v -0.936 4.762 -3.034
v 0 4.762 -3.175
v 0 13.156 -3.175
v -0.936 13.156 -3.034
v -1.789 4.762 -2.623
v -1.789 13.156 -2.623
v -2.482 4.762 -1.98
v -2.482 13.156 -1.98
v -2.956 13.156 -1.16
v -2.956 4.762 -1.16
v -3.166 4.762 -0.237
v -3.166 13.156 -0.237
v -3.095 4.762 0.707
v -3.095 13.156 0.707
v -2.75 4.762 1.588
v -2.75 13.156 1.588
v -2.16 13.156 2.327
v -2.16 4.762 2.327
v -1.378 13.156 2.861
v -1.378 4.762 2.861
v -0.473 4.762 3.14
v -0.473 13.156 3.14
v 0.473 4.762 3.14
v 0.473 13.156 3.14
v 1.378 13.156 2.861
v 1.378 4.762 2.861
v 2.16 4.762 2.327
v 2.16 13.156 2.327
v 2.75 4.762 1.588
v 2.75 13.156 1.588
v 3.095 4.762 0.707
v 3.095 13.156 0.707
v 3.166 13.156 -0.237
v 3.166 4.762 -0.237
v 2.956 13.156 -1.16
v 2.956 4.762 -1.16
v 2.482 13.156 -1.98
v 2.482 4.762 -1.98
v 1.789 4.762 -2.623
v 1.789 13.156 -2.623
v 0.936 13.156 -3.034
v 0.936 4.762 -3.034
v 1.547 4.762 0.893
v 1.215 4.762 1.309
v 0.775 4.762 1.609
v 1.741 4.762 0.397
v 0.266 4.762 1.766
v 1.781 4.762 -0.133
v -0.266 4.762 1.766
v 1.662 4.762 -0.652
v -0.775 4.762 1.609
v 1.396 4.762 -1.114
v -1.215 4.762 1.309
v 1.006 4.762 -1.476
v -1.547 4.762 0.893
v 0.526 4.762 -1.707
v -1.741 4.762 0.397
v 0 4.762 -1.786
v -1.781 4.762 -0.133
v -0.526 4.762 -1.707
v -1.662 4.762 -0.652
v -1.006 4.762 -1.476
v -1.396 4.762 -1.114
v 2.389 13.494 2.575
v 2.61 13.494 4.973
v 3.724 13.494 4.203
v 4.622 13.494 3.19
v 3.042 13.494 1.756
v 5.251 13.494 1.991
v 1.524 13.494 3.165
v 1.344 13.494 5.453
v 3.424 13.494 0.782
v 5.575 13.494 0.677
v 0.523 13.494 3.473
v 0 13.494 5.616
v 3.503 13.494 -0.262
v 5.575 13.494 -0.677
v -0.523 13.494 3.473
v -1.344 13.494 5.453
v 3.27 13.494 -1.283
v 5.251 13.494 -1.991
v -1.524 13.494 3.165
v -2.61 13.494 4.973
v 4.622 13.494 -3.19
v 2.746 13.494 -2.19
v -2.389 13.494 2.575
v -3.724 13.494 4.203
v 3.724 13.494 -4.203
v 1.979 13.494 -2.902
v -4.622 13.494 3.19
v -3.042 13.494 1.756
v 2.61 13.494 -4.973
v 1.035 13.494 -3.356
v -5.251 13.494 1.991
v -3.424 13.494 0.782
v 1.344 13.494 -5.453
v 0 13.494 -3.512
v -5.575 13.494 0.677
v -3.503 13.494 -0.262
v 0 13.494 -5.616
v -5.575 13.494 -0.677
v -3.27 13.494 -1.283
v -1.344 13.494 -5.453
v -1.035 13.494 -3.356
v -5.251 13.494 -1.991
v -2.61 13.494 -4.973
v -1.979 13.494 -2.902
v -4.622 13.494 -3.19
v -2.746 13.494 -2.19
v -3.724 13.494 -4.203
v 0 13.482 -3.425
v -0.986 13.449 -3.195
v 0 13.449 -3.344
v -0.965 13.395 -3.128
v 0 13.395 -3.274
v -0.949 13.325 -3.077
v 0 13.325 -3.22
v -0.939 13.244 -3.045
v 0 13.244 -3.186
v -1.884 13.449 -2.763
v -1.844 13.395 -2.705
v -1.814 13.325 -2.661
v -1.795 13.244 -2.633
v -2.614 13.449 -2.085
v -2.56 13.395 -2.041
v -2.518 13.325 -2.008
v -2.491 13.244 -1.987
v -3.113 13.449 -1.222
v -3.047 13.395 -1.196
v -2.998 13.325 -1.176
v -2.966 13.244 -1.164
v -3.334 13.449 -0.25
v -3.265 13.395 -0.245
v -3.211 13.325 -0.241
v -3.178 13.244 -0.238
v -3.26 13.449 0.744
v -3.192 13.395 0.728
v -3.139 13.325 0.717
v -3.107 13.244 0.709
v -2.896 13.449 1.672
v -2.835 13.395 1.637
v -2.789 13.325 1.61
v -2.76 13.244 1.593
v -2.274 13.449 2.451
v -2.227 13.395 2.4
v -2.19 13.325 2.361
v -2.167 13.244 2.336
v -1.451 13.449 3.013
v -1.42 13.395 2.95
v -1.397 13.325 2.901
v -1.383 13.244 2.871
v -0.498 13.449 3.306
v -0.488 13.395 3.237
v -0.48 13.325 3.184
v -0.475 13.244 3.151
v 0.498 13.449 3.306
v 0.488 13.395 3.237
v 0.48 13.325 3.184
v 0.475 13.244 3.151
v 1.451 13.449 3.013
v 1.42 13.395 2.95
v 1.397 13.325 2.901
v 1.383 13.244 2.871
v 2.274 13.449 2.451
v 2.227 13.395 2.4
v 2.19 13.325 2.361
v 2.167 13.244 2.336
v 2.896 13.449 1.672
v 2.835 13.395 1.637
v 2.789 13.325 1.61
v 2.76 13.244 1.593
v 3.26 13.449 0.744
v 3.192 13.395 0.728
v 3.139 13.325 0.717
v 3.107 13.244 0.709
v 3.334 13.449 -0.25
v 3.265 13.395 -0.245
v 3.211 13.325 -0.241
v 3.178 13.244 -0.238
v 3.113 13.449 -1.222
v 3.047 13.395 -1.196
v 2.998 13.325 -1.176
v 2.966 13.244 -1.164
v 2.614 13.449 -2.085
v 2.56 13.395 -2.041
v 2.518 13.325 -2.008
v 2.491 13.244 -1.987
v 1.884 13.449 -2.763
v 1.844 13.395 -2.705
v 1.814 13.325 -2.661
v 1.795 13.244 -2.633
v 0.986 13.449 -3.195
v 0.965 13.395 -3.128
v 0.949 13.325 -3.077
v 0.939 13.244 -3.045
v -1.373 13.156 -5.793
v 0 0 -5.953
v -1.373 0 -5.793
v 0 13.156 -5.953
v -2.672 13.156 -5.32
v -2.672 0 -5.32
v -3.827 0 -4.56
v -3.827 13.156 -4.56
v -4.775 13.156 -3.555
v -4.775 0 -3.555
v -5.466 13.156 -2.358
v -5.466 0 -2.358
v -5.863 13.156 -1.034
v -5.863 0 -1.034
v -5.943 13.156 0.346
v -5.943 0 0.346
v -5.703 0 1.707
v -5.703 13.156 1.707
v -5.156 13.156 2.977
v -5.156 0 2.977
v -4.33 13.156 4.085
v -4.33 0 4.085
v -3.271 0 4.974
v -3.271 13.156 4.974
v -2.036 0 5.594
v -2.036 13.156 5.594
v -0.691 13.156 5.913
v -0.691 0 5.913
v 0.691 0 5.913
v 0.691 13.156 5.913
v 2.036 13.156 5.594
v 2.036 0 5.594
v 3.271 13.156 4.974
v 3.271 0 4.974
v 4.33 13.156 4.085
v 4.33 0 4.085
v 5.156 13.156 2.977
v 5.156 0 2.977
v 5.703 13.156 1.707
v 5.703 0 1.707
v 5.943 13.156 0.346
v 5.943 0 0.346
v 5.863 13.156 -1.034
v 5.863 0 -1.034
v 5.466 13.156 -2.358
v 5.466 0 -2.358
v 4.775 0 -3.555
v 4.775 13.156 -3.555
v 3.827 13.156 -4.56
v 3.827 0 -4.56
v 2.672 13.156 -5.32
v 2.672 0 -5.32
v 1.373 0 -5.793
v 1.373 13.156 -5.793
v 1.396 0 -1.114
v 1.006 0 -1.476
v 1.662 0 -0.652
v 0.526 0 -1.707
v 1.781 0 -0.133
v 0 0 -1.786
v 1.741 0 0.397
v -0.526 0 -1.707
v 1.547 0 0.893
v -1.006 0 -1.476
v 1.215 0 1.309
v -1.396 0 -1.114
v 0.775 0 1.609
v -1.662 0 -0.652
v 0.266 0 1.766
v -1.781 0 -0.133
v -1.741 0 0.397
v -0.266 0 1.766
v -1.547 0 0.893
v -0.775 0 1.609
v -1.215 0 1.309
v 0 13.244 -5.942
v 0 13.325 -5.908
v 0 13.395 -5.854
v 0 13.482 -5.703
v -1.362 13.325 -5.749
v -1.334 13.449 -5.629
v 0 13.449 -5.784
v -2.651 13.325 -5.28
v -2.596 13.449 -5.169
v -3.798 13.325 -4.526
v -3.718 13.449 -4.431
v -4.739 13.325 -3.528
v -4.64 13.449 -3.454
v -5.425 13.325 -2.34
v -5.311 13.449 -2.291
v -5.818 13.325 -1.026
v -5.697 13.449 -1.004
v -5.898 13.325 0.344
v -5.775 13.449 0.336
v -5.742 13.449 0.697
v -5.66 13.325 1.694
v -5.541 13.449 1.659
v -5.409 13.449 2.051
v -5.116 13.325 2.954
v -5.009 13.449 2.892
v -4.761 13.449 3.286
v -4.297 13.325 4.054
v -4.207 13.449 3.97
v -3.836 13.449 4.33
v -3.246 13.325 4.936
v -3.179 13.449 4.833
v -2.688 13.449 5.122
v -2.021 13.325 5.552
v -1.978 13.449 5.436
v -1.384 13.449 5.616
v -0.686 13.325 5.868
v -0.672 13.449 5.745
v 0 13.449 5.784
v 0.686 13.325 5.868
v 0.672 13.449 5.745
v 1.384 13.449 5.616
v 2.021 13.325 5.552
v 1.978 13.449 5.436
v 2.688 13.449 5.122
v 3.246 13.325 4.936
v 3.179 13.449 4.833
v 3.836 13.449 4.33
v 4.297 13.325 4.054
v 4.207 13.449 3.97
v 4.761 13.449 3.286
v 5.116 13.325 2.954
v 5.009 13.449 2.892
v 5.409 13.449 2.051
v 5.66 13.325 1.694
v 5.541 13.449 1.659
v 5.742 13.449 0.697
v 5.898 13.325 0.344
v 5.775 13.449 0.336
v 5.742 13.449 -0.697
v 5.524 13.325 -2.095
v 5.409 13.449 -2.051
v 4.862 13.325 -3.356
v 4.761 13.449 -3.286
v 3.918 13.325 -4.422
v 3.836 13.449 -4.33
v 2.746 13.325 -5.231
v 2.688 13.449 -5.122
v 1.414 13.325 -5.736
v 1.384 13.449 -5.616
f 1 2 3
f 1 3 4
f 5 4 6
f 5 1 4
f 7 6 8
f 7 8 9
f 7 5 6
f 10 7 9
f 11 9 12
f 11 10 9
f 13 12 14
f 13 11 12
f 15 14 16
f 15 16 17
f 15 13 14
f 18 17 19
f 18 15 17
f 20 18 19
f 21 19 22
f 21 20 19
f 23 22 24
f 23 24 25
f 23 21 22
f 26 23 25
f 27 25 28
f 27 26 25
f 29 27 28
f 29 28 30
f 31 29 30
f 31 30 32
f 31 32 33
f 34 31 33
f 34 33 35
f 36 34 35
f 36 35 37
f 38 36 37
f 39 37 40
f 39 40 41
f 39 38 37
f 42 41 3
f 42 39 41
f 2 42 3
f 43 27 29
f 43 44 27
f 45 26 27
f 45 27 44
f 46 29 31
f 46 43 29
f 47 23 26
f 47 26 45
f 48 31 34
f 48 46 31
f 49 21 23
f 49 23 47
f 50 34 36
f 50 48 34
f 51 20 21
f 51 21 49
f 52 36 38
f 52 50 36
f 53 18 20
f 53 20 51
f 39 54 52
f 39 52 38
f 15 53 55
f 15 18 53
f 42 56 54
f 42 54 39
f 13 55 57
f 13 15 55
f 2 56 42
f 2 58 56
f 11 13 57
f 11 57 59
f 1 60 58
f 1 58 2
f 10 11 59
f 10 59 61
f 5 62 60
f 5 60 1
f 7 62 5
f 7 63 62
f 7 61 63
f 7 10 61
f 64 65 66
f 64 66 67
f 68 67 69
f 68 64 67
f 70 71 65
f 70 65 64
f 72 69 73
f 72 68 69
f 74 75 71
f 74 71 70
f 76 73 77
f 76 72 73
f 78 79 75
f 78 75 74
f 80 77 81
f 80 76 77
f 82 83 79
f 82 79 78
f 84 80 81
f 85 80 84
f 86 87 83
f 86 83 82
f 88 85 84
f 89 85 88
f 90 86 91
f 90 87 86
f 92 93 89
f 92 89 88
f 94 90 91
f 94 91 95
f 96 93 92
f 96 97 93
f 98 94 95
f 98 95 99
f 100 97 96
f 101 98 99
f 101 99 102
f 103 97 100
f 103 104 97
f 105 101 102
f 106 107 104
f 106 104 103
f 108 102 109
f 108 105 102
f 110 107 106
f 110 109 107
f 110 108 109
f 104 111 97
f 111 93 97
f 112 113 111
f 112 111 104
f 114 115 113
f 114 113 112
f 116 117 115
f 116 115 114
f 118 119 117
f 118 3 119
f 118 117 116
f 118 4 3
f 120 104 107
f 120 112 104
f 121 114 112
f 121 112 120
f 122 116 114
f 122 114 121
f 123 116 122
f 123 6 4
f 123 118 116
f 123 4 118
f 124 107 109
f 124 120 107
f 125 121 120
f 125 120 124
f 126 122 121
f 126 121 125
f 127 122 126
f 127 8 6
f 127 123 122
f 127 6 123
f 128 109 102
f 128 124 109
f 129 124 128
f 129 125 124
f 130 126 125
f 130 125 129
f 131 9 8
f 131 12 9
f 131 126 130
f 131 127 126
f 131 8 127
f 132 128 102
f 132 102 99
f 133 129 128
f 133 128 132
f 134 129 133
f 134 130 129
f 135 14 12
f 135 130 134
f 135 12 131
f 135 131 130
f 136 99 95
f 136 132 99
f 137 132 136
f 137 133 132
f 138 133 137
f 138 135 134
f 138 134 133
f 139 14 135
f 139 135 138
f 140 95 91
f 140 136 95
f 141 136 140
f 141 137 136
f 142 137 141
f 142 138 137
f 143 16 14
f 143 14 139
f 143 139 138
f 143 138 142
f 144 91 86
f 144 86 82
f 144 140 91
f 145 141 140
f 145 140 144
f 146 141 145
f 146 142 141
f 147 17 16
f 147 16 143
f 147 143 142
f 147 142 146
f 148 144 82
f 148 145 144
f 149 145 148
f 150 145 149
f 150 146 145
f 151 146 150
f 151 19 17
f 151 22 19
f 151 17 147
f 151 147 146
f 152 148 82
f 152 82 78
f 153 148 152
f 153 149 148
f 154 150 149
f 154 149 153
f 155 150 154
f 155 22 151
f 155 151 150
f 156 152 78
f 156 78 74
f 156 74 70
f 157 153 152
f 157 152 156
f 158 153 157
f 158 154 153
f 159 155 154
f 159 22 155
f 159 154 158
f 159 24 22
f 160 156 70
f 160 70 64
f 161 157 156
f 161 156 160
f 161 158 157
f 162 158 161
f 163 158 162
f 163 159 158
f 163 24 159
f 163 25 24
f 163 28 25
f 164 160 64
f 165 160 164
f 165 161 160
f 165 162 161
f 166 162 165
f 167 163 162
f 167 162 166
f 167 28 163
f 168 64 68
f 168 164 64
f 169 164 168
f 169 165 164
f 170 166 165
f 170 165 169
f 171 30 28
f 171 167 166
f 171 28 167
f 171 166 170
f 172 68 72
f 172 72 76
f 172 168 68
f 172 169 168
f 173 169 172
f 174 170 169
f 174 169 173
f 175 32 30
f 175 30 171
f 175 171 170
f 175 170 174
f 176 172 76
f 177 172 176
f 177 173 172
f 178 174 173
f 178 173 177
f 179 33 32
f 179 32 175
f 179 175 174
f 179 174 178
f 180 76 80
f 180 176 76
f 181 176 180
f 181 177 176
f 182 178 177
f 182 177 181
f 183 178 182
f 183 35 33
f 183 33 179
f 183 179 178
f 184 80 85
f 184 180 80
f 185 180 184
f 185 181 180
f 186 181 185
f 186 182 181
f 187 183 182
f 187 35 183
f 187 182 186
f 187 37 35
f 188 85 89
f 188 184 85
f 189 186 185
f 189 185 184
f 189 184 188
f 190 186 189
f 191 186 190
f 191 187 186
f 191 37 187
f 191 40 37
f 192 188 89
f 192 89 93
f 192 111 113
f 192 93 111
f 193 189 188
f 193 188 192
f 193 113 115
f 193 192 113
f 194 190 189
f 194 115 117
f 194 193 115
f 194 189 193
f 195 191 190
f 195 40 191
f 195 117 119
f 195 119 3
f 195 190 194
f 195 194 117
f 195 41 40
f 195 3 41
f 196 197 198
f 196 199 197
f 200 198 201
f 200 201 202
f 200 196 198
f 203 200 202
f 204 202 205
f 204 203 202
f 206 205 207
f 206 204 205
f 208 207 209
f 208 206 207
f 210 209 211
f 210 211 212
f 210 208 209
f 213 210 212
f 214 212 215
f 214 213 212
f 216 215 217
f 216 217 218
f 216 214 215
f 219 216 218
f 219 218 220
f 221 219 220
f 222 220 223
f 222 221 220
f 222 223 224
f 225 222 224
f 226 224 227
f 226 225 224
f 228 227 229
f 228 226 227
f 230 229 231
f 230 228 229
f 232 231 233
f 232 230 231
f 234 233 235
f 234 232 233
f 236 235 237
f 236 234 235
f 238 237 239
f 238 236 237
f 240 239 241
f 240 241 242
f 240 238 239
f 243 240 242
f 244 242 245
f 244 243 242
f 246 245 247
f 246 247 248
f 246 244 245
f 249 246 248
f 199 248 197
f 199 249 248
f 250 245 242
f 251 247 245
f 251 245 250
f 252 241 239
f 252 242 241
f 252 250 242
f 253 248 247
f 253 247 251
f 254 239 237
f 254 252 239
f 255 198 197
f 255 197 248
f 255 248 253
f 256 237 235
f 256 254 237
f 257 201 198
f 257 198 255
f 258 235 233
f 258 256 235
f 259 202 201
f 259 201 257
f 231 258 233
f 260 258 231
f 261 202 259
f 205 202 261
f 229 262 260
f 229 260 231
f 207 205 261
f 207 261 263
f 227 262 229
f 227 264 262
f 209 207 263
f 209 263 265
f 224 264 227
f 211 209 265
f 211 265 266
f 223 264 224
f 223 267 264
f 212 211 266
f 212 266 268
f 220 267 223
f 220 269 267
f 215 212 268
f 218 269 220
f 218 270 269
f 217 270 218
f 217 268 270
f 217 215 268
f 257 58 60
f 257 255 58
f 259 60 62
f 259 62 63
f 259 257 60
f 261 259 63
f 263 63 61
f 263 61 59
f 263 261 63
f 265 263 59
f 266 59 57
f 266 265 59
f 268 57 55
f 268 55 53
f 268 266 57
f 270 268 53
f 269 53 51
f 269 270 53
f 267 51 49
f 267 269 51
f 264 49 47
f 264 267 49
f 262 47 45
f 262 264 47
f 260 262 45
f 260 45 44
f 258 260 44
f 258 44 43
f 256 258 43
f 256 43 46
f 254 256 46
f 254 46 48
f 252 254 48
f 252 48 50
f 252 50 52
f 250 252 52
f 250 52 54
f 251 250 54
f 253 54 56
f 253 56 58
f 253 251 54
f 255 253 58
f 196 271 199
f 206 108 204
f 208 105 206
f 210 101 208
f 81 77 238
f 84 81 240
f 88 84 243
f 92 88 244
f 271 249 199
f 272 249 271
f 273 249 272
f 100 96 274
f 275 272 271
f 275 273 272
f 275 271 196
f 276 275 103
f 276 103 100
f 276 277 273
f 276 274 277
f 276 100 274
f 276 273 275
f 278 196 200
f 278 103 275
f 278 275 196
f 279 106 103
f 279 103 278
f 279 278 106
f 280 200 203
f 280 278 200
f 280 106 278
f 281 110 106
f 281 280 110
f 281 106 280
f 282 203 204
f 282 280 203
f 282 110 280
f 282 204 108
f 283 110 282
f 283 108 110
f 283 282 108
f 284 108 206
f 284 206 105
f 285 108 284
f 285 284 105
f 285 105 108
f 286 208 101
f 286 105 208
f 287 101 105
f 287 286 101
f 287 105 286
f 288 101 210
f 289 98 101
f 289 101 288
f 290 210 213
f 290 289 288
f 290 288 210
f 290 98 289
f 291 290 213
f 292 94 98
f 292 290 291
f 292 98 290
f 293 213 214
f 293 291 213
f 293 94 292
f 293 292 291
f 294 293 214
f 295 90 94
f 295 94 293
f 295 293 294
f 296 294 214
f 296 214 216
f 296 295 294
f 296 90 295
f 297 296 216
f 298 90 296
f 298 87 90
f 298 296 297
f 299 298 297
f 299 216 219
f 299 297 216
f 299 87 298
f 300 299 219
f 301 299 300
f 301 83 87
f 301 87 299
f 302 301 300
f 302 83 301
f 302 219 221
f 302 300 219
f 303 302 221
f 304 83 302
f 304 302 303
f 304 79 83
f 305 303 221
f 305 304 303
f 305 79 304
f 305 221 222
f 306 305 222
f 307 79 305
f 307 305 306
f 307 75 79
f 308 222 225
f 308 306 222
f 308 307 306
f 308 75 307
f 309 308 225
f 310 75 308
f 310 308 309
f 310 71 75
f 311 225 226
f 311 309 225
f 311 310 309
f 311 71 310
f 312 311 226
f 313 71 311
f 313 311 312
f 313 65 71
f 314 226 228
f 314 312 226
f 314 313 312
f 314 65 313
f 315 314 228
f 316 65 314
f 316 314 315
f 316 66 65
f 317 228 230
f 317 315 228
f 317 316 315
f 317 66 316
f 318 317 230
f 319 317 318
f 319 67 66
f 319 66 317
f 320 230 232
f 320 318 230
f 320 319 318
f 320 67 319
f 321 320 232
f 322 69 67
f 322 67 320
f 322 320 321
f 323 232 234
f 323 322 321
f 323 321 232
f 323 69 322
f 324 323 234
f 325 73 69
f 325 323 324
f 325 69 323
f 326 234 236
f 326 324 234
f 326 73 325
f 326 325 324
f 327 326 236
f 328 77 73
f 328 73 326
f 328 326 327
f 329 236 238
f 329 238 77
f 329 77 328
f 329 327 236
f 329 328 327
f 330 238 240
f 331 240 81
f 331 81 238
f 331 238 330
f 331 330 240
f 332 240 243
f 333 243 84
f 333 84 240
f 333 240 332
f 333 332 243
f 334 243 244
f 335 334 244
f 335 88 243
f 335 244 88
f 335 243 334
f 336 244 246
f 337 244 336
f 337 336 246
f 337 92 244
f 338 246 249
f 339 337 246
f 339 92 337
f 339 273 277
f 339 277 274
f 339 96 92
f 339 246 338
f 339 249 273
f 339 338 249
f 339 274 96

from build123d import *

# Parameters (mm, degrees)
FILLET1_R = 0.33734375


with BuildPart() as part:
    # Sketch2 → Revolve1 (revolve)
    with BuildSketch(Plane.XY):
        with BuildLine():
            Line((-5.953125, 0), (-5.953125, 13.15640625))
            ThreePointArc((-5.953125, 13.15640625), (-5.854319303, 13.394944303), (-5.61578125, 13.49375))
            Line((-5.61578125, 13.49375), (-3.175, 13.49375))
            Line((-3.175, 13.49375), (-3.175, 4.7625))
            Line((-3.175, 4.7625), (-1.7859375, 4.7625))
            Line((-1.7859375, 4.7625), (-1.7859375, 0))
            Line((-1.7859375, 0), (-5.953125, 0))
        make_face()
    revolve(axis=Axis((0, 0, 0), (0, 1, 0)))

    # Fillet1
    fillet1_edges = [part.edges().sort_by_distance(p)[0] for p in [
        (3.175, 13.49375, 0),
    ]]
    fillet(fillet1_edges, radius=FILLET1_R)


solid = part.part
